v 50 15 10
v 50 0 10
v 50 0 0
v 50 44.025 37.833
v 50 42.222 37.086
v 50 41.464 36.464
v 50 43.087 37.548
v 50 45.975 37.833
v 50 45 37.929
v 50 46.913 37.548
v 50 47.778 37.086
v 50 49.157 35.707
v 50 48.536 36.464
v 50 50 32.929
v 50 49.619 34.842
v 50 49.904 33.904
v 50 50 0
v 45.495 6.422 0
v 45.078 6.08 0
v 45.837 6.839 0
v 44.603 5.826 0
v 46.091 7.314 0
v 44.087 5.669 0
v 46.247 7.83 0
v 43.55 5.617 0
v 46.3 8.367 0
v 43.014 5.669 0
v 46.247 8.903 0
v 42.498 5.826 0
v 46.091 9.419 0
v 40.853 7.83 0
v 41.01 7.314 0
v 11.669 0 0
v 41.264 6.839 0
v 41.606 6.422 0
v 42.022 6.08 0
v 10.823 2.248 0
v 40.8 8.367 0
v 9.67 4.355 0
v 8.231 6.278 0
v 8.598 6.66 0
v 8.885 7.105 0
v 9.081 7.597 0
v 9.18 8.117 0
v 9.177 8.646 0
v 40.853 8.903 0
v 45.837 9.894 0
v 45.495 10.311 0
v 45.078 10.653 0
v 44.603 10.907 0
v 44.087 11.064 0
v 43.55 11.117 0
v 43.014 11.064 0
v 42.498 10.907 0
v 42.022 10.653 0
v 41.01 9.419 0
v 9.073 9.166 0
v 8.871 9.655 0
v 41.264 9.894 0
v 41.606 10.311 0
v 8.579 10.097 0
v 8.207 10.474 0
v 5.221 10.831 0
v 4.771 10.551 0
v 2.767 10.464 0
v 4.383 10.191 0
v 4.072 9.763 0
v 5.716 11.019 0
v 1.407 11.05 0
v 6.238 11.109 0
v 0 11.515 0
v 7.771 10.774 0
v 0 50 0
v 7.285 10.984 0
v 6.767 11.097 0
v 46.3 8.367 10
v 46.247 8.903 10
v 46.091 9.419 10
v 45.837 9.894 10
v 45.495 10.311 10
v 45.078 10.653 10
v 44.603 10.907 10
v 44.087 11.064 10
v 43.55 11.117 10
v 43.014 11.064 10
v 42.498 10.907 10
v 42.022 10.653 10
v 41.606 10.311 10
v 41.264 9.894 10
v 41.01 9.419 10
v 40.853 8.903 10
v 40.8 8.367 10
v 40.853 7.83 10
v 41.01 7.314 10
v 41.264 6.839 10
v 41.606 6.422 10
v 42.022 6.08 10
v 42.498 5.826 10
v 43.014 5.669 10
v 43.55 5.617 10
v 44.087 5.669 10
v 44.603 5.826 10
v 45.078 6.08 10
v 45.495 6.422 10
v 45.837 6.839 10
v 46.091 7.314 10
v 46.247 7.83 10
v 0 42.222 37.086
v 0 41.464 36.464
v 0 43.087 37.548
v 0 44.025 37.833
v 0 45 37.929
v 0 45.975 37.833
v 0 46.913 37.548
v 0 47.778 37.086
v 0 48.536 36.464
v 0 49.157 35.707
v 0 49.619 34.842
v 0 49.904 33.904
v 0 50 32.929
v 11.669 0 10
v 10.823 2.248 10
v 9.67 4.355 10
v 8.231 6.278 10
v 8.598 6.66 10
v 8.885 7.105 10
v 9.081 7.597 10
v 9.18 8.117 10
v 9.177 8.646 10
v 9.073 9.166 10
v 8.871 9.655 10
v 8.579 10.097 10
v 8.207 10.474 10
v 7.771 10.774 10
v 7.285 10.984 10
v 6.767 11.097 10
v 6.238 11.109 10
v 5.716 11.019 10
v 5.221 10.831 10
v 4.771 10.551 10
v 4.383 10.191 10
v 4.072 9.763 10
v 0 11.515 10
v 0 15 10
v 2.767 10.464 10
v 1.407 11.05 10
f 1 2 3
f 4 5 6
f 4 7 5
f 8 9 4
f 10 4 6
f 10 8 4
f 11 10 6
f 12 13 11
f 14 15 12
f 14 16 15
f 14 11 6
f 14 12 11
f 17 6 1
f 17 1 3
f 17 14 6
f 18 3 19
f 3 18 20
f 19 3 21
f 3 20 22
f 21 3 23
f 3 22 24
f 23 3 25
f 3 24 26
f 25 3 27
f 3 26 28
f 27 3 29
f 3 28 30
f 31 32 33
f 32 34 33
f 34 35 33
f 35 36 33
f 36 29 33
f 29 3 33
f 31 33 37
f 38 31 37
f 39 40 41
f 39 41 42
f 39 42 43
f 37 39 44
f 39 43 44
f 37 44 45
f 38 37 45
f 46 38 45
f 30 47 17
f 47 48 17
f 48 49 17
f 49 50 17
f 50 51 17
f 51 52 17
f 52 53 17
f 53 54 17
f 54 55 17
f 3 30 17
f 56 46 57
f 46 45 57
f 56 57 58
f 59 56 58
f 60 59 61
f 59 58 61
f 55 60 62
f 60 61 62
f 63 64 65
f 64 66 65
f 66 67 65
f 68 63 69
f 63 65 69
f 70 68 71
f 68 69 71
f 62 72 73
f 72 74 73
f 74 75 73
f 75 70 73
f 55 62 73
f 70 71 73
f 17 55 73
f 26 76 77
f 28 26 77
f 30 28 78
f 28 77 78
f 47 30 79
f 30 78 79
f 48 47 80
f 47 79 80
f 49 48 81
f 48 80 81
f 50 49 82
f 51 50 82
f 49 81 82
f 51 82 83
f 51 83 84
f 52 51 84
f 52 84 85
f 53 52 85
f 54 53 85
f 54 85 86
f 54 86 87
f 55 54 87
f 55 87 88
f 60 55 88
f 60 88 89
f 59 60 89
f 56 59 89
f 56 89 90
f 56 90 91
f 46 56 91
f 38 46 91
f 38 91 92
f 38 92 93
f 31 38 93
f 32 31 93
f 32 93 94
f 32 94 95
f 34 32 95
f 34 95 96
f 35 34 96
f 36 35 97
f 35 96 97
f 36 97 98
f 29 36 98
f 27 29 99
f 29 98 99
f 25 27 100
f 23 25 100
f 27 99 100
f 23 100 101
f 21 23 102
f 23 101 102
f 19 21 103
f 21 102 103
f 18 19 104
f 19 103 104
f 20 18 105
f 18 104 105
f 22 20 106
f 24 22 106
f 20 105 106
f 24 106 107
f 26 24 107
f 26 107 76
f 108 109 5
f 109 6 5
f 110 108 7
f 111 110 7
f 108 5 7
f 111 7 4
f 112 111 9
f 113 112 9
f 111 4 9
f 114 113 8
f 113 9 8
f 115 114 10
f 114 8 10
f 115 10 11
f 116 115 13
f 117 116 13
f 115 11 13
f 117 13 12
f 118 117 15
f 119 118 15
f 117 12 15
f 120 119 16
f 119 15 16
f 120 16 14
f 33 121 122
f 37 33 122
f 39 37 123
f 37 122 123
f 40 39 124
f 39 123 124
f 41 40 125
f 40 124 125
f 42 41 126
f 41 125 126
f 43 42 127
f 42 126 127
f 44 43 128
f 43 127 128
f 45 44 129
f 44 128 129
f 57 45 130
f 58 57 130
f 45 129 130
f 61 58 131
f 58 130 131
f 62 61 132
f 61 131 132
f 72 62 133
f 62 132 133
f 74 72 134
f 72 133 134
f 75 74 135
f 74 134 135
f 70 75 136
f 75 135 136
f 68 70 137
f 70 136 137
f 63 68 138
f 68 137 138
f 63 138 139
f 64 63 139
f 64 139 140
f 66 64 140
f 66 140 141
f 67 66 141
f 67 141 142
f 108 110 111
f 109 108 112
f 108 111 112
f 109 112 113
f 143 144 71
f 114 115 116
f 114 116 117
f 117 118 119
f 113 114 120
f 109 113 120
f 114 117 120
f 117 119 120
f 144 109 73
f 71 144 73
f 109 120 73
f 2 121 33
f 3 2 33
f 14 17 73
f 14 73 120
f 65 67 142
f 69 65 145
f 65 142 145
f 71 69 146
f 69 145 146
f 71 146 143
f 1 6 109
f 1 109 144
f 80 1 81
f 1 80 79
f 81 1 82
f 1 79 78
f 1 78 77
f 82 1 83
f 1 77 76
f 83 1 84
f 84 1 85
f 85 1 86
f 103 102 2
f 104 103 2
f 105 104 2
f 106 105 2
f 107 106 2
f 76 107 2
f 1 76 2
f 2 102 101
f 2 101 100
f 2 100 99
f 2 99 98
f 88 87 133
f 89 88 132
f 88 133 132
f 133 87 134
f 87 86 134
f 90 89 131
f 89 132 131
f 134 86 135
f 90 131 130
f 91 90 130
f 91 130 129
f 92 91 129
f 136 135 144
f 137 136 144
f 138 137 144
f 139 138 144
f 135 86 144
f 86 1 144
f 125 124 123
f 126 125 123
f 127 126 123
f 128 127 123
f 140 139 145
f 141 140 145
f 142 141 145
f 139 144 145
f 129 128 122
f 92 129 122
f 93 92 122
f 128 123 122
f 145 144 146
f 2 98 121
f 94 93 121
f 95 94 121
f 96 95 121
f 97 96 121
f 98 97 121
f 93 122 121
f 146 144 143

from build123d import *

# Parameters (mm, degrees)
BOSS_EXTRUDE1_DEPTH = 50
SKETCH3_R           = 17
CUT_EXTRUDE1_DEPTH  = 10
SKETCH4_R           = 2.75
CUT_EXTRUDE2_DEPTH  = 30
FILLET1_R           = 5


with BuildPart() as part:
    # Sketch2 → Boss-Extrude1 (new body)
    with BuildSketch(Plane(origin=(0, 0, 0), x_dir=(0, 0, -1), z_dir=(1, 0, 0))):
        Polygon((0, 0), (0, 50), (-45, 50), (-10, 15), (-10, 0), align=None)
    extrude(amount=BOSS_EXTRUDE1_DEPTH)

    # Sketch3 → Cut-Extrude1 (cut)
    with BuildSketch(Plane.XY.offset(10)):
        with Locations((-4.626643485, -4.843430201)):
            Circle(SKETCH3_R)
    extrude(amount=-CUT_EXTRUDE1_DEPTH, mode=Mode.SUBTRACT)

    # Sketch4 → Cut-Extrude2 (cut)
    with BuildSketch(Plane.XY.offset(10)):
        with Locations((6.441325863, 8.36656836)):
            Circle(SKETCH4_R)
        with Locations((43.550213874, 8.36656836)):
            Circle(SKETCH4_R)
    extrude(amount=-CUT_EXTRUDE2_DEPTH, mode=Mode.SUBTRACT)

    # Fillet1
    fillet1_edges = [part.edges().sort_by_distance(p)[0] for p in [
        (25, 50, 45),
    ]]
    fillet(fillet1_edges, radius=FILLET1_R)


solid = part.part
